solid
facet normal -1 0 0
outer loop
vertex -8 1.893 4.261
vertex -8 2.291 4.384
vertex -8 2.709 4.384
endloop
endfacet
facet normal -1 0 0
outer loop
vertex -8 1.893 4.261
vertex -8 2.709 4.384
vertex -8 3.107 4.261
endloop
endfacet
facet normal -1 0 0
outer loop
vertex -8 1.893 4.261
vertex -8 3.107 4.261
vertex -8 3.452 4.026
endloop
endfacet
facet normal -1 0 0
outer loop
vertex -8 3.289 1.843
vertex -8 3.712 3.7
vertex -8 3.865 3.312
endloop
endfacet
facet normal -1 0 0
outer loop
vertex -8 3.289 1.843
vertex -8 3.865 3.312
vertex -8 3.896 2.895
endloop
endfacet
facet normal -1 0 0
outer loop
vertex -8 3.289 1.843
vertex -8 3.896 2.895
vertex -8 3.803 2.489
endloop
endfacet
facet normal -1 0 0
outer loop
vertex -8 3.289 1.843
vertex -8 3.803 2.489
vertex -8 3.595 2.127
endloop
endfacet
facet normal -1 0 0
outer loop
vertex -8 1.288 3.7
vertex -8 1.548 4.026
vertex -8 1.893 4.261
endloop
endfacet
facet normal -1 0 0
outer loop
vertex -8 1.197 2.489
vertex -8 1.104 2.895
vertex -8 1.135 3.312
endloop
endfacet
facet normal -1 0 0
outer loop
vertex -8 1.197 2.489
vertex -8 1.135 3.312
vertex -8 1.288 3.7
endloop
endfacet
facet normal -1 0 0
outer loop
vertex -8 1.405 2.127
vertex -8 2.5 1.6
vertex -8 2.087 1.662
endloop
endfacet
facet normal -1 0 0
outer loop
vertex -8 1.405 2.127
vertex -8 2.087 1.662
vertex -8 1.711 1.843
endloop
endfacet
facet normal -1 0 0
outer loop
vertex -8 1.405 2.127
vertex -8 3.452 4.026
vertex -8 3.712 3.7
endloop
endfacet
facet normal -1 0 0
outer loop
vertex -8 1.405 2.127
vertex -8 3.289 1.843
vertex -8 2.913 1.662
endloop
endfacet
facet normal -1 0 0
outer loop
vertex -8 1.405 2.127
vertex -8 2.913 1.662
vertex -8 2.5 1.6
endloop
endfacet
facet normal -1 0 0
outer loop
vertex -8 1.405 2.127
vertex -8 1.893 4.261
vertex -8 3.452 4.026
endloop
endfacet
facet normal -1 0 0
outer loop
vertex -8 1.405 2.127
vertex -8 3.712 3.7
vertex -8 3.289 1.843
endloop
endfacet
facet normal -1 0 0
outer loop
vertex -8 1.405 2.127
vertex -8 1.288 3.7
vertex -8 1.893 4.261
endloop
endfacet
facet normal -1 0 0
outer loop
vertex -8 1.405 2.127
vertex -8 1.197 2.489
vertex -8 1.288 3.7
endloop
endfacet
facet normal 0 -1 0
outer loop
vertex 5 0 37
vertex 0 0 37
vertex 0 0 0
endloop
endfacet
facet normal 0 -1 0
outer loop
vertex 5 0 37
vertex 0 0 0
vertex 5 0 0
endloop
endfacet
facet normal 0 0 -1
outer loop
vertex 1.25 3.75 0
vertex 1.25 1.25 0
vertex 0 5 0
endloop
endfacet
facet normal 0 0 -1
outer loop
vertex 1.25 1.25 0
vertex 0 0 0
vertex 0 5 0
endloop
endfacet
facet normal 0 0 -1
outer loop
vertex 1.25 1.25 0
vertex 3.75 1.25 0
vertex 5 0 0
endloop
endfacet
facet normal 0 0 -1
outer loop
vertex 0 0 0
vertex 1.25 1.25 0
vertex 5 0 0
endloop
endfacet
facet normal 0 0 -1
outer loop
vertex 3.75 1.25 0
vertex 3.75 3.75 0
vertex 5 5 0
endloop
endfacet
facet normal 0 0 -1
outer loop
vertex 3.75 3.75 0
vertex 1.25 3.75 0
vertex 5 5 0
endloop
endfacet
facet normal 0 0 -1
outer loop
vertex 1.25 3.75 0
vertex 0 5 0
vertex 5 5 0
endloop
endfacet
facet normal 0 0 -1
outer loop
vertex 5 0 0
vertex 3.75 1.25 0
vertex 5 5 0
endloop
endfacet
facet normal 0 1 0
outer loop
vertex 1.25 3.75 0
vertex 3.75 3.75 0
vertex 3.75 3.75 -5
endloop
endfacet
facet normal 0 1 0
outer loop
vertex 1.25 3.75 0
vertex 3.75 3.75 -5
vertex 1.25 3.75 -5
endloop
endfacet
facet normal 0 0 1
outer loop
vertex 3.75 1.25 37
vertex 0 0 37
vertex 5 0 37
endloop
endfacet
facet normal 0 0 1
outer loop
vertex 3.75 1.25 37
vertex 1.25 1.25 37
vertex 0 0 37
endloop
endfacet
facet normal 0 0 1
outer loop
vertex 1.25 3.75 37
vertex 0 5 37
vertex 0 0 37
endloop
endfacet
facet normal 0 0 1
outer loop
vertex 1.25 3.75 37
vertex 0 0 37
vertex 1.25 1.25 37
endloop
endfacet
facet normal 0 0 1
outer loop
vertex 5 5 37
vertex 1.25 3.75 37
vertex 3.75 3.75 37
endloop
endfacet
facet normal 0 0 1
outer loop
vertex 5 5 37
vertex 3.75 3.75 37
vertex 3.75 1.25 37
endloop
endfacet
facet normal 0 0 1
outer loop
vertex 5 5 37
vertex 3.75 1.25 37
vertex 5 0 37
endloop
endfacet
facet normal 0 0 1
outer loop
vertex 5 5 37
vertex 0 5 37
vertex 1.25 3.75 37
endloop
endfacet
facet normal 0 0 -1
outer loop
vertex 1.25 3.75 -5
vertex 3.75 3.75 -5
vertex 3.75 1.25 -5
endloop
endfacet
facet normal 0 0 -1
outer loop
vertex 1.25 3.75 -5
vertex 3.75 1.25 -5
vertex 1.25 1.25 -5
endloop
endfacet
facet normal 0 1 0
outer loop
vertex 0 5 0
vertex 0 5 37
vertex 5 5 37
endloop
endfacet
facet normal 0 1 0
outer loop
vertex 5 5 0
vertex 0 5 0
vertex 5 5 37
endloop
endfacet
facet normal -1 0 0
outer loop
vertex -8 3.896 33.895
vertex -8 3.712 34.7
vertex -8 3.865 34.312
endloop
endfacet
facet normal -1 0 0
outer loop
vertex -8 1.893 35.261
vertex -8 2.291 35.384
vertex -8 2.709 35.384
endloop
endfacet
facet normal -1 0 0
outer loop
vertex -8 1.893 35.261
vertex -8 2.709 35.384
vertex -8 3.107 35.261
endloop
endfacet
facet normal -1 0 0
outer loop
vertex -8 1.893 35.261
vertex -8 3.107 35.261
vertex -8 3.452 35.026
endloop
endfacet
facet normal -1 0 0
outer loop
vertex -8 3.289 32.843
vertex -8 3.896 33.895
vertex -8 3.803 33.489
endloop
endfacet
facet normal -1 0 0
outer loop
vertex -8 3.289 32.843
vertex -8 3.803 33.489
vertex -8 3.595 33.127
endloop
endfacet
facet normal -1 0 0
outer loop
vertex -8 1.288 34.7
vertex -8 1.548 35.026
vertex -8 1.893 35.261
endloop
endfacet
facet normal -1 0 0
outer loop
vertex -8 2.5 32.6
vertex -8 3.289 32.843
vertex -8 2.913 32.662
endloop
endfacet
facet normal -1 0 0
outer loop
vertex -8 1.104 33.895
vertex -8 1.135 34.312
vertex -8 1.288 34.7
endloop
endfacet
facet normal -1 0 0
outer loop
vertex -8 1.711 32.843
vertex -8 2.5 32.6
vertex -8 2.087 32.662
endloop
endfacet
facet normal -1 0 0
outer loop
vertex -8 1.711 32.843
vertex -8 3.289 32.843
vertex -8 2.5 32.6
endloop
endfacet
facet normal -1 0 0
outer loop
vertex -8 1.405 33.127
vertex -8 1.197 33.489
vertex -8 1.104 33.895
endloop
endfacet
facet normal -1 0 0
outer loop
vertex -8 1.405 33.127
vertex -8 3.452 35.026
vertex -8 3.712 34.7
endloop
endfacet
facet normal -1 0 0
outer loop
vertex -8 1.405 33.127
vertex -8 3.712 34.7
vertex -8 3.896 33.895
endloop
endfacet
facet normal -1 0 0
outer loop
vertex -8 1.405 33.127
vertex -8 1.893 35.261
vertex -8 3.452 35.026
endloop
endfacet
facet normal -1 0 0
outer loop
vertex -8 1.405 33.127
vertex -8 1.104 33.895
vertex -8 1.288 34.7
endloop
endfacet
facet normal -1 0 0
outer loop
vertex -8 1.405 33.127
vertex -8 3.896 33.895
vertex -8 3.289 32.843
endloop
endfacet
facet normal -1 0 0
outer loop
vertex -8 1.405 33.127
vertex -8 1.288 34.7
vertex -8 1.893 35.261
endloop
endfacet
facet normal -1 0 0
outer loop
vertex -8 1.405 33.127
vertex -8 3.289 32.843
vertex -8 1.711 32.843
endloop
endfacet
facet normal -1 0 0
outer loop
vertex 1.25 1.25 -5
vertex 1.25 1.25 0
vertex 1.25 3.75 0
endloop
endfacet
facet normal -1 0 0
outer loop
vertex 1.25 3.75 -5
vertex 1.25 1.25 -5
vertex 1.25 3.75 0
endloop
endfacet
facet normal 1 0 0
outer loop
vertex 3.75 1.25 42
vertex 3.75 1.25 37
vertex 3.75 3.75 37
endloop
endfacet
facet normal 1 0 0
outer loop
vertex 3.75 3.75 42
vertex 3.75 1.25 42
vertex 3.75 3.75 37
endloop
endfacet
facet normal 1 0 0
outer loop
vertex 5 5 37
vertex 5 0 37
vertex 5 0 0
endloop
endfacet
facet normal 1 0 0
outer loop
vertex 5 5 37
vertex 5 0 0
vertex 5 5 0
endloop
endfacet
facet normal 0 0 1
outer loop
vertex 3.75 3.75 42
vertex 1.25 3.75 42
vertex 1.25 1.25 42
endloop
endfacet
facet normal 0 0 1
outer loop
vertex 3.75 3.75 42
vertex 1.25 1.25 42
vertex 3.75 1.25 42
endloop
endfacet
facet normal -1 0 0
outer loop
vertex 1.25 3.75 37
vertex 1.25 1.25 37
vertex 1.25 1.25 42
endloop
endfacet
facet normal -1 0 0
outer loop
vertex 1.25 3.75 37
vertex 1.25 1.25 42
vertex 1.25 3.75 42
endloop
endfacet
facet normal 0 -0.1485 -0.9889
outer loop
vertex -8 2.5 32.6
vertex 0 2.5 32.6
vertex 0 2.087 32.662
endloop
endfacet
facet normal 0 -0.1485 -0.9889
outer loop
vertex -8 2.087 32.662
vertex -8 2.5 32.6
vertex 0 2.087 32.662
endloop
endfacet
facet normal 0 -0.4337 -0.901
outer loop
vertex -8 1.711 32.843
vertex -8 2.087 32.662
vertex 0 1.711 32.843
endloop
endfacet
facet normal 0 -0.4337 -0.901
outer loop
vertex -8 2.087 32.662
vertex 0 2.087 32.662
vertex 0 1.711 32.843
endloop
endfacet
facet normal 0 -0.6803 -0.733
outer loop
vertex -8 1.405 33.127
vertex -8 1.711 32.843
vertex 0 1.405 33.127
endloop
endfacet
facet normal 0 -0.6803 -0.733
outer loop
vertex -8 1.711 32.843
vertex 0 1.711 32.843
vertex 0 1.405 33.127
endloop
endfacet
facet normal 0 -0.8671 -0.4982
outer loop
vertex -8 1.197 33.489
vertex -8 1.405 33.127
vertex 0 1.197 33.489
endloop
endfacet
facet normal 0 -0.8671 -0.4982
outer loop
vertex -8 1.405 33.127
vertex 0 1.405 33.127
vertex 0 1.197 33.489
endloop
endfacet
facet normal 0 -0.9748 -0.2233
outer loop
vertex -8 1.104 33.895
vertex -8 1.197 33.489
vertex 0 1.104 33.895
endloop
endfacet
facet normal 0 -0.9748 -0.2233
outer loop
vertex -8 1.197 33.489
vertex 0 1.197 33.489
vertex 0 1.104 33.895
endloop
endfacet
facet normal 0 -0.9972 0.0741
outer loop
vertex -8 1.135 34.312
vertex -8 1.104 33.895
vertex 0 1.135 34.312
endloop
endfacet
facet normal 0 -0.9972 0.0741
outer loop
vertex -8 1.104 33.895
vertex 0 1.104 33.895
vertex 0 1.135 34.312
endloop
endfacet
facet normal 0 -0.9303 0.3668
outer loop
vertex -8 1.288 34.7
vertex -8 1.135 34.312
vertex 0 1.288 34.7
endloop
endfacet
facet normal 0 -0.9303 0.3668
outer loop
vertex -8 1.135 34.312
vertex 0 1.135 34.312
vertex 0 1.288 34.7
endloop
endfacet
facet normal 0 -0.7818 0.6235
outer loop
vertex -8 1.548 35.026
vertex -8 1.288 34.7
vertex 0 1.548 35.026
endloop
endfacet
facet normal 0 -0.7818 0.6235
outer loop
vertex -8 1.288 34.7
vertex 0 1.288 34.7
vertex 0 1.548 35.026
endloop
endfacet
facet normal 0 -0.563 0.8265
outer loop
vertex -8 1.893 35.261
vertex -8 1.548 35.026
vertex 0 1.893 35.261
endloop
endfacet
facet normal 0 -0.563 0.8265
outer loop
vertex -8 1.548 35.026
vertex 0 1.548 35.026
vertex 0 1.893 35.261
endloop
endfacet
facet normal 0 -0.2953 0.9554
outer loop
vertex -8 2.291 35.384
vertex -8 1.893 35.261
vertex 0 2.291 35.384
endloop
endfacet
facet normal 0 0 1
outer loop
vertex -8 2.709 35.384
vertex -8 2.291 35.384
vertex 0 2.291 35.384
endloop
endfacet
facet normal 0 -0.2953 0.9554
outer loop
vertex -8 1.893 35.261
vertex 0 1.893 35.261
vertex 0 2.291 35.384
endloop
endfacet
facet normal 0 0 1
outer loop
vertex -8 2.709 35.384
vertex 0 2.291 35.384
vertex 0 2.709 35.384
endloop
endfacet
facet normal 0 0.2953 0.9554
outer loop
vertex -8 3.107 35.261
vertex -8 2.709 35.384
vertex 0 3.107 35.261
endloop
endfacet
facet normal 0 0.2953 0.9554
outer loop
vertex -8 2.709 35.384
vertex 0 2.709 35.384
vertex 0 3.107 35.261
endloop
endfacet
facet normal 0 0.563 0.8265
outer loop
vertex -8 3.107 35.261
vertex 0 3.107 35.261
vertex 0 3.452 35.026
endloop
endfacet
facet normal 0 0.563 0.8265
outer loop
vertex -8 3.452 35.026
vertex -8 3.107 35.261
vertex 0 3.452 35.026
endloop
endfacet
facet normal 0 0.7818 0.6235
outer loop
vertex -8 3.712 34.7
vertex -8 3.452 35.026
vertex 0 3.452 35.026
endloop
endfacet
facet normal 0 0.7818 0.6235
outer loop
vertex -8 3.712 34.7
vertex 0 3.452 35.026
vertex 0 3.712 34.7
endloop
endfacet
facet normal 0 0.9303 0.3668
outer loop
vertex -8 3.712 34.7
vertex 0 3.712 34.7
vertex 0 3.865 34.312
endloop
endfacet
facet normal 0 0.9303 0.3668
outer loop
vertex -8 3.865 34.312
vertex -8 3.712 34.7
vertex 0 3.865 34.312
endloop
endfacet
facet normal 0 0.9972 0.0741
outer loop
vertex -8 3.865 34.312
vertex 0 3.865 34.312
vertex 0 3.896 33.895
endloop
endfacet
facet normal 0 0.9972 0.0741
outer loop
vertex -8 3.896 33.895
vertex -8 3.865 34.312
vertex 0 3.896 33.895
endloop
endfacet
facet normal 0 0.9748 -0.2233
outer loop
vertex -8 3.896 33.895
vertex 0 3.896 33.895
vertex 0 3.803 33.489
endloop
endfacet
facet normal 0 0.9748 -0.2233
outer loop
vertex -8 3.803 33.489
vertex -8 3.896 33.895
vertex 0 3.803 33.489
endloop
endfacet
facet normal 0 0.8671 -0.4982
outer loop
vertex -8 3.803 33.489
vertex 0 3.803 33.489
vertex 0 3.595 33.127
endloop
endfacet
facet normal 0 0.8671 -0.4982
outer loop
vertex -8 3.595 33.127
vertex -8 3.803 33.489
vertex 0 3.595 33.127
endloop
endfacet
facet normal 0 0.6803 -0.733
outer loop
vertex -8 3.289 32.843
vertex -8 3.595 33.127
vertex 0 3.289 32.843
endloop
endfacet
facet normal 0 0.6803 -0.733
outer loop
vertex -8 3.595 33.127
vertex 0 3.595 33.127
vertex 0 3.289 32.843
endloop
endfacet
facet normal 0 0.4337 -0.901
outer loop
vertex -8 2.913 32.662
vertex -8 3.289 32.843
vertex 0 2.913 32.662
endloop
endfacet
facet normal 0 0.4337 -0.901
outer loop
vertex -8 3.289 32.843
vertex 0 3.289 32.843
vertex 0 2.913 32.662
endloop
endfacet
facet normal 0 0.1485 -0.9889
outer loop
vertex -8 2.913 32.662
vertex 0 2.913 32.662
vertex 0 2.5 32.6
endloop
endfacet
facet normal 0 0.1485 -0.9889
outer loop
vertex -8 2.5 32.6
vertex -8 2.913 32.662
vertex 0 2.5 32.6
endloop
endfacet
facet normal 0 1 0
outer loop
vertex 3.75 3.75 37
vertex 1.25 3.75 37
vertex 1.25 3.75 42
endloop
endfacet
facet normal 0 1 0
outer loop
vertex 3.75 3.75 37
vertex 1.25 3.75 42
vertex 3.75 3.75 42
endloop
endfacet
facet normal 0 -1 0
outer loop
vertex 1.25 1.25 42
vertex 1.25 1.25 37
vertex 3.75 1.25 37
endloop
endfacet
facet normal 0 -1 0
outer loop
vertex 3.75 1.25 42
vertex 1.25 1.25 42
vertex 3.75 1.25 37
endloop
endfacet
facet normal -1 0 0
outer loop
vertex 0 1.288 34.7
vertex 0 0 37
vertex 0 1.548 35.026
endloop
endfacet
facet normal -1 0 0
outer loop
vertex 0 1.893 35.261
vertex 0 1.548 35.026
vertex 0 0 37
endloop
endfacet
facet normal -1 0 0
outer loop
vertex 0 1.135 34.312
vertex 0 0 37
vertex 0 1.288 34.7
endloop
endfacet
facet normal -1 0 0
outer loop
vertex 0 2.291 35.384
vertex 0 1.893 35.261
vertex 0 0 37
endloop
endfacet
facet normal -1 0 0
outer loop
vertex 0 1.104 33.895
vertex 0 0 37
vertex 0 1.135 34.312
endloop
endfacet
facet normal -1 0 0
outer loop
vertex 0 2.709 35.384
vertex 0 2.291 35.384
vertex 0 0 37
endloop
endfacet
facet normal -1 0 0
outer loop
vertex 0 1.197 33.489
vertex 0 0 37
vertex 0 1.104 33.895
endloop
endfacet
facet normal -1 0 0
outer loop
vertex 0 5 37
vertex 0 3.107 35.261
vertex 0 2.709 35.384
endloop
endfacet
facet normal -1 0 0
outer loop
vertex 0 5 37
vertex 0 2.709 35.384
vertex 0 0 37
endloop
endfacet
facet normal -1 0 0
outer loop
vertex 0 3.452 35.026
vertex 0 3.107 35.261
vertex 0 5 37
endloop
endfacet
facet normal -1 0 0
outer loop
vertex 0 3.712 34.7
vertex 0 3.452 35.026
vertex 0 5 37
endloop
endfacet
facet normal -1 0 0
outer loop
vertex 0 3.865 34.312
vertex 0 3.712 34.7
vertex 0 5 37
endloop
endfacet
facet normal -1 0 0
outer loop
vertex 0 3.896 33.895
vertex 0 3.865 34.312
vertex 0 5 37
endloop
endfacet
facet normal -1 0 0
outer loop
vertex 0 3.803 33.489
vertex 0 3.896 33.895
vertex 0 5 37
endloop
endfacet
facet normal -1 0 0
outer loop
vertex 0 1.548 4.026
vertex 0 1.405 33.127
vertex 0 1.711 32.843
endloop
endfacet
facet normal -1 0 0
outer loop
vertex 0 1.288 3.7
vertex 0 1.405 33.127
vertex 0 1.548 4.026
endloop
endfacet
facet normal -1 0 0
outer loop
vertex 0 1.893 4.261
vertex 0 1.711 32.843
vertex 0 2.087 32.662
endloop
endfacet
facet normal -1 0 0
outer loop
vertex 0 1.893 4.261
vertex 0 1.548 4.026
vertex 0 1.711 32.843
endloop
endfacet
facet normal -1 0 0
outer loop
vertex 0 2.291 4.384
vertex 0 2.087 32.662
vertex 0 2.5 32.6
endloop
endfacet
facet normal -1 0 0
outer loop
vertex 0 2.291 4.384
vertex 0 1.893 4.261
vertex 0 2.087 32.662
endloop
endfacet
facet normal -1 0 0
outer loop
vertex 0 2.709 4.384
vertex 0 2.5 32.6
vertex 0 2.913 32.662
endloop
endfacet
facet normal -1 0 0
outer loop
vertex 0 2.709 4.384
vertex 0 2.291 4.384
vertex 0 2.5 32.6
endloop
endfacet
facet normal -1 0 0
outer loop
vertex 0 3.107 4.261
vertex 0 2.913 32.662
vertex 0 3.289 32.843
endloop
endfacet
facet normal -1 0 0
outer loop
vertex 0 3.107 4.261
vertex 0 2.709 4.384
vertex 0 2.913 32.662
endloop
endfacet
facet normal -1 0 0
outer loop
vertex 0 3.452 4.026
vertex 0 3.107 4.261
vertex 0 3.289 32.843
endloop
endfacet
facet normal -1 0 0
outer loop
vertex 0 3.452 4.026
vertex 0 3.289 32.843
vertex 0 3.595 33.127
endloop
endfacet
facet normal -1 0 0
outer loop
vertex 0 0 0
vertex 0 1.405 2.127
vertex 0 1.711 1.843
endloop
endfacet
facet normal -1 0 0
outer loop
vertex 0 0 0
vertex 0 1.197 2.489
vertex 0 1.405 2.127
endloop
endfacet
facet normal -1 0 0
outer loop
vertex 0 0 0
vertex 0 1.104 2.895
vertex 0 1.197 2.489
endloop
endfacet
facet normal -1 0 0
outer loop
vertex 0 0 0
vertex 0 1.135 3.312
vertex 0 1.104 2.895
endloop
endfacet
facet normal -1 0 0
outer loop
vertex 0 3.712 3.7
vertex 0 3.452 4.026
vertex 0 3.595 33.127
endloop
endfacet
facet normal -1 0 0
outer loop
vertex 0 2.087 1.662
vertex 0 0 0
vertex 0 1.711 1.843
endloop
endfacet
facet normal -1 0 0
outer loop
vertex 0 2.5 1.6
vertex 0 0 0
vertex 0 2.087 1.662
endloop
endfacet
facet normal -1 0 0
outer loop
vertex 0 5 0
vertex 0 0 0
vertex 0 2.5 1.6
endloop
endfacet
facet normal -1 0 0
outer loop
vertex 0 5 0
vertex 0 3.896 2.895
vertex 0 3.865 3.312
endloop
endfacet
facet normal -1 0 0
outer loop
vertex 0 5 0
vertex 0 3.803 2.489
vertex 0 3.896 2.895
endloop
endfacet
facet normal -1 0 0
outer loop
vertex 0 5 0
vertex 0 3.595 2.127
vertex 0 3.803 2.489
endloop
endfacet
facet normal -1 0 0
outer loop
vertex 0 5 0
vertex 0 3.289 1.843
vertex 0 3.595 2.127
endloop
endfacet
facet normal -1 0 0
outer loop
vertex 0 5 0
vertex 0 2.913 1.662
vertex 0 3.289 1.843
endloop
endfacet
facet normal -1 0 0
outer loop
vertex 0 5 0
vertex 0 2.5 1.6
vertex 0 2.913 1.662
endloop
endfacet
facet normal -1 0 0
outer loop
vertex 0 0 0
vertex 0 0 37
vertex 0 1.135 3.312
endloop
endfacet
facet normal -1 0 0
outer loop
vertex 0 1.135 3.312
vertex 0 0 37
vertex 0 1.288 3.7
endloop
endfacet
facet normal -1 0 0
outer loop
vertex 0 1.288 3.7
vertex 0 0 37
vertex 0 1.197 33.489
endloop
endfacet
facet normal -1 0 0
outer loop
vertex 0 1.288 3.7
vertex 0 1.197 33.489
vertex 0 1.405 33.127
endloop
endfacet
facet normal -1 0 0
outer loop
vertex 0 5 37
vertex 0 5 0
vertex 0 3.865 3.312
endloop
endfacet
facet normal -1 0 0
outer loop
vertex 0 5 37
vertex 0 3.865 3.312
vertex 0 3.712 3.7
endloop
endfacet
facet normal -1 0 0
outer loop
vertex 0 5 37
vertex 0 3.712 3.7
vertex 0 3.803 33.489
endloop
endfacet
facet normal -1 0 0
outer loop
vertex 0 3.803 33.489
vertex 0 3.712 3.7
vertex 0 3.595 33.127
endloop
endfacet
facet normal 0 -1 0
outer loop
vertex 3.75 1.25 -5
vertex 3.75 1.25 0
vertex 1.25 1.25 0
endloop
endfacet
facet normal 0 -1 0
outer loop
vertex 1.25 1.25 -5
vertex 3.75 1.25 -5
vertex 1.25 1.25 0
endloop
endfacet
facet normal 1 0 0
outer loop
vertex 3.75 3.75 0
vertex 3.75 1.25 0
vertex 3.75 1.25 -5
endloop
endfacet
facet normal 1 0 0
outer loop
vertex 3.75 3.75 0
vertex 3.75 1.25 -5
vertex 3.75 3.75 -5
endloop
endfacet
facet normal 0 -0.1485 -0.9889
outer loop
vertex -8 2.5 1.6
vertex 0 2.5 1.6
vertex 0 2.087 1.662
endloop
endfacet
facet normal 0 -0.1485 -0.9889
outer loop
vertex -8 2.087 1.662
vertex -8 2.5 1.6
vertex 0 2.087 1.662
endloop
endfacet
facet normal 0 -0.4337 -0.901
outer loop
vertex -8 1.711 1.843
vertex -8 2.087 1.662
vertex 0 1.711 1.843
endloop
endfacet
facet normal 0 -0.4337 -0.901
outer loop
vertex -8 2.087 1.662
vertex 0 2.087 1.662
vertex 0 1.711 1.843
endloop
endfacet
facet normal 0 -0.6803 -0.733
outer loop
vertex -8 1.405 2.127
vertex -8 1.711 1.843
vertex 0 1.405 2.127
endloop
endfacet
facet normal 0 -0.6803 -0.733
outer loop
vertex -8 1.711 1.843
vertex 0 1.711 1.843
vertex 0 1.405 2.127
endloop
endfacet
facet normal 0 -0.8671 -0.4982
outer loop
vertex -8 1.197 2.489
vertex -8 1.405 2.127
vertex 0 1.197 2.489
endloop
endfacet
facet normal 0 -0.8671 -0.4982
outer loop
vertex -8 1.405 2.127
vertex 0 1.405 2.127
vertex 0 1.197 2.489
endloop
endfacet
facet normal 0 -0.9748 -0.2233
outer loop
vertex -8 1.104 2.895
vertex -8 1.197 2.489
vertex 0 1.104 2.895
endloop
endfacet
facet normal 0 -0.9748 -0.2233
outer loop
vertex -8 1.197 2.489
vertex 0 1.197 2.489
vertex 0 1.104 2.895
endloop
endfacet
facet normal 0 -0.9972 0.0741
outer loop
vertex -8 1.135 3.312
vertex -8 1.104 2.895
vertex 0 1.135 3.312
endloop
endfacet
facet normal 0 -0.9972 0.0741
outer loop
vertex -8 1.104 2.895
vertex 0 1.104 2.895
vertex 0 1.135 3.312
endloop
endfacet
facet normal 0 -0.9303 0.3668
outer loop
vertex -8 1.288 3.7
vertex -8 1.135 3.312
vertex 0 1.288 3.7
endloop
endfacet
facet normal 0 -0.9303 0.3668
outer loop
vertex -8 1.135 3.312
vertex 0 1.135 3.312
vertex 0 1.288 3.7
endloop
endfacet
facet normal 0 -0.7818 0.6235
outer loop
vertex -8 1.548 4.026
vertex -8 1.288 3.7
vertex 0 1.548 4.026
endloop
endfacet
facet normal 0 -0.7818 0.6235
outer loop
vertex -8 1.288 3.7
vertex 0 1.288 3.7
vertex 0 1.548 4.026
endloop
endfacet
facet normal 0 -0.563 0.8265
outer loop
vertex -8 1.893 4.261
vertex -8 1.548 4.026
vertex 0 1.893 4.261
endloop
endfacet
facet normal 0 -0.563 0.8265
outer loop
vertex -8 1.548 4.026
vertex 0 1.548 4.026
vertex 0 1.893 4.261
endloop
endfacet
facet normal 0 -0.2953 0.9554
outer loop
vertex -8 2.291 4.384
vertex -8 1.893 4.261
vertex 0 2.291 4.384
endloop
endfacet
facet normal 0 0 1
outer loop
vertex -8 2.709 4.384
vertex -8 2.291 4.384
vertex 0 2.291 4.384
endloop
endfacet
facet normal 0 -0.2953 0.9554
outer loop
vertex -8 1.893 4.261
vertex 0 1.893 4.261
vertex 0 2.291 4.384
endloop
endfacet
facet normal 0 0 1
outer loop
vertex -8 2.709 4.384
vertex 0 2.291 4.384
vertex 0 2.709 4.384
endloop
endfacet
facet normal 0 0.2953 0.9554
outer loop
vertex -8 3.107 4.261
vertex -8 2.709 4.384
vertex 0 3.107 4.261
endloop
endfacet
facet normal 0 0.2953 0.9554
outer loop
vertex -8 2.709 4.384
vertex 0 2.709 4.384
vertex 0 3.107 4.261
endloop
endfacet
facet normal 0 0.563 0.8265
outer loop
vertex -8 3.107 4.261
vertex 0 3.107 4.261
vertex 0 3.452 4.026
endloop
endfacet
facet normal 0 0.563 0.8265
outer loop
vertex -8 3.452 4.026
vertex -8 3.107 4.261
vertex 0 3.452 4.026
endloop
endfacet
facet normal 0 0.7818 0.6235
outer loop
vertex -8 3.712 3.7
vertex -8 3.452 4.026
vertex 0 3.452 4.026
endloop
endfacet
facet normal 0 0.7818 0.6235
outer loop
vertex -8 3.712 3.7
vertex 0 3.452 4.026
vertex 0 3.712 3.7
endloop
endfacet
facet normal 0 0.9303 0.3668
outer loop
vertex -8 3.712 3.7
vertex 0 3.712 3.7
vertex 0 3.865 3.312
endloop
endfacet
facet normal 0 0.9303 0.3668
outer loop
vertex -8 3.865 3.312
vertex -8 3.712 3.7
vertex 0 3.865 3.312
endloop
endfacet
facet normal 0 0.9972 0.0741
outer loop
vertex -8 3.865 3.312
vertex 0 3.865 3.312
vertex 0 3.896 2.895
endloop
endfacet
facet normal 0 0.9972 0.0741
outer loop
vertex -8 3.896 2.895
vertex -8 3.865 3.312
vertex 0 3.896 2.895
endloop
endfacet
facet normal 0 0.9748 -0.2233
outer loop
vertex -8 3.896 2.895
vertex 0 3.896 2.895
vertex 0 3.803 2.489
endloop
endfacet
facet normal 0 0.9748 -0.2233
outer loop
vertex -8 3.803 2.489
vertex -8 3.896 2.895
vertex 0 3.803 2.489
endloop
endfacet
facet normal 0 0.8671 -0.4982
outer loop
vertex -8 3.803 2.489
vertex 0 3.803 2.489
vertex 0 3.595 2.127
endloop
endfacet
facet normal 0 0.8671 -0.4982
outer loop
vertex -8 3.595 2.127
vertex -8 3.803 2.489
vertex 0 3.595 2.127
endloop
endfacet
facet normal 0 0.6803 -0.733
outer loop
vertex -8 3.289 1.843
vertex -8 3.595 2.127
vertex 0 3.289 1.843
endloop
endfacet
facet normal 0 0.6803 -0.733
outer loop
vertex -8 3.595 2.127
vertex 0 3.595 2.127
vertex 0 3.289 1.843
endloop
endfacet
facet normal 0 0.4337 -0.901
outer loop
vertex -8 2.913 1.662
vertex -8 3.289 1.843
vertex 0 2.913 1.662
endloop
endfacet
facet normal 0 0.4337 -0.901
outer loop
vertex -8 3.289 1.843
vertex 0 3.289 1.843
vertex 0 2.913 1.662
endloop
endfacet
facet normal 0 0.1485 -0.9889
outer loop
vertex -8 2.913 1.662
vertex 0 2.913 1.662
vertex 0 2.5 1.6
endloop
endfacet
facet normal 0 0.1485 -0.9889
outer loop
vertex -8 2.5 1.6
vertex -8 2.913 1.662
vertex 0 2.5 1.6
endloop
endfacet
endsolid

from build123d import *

# Parameters (mm, degrees)
SKETCH1_W           = 5
SKETCH1_H           = 5
BOSS_EXTRUDE1_DEPTH = 37
SKETCH2_W           = 2.5
SKETCH2_H           = 2.5
BOSS_EXTRUDE2_DEPTH = 5
SKETCH3_W           = 2.5
SKETCH3_H           = 2.5
BOSS_EXTRUDE3_DEPTH = 5
SKETCH4_R           = 1.4
BOSS_EXTRUDE4_DEPTH = 8


with BuildPart() as part:
    # Sketch1 → Boss-Extrude1 (new body)
    with BuildSketch(Plane.XY):
        with Locations((2.5, 2.5)):
            Rectangle(SKETCH1_W, SKETCH1_H)
    extrude(amount=BOSS_EXTRUDE1_DEPTH)

    # Sketch2 → Boss-Extrude2 (add)
    with BuildSketch(Plane.XY.offset(37)):
        with Locations((2.5, 2.5)):
            Rectangle(SKETCH2_W, SKETCH2_H)
    extrude(amount=BOSS_EXTRUDE2_DEPTH)

    # Sketch3 → Boss-Extrude3 (add)
    with BuildSketch(Plane(origin=(0, 0, 0), x_dir=(-1, 0, 0), z_dir=(0, 0, -1))):
        with Locations((-2.5, 2.5)):
            Rectangle(SKETCH3_W, SKETCH3_H)
    extrude(amount=BOSS_EXTRUDE3_DEPTH)

    # Sketch4 → Boss-Extrude4 (add)
    with BuildSketch(Plane.ZY):
        with Locations(Location((3, 2.5, 0), (0, 0, 180))):
            Circle(SKETCH4_R)
        with Locations(Location((34, 2.5, 0), (0, 0, 180))):
            Circle(SKETCH4_R)
    extrude(amount=BOSS_EXTRUDE4_DEPTH)


solid = part.part
